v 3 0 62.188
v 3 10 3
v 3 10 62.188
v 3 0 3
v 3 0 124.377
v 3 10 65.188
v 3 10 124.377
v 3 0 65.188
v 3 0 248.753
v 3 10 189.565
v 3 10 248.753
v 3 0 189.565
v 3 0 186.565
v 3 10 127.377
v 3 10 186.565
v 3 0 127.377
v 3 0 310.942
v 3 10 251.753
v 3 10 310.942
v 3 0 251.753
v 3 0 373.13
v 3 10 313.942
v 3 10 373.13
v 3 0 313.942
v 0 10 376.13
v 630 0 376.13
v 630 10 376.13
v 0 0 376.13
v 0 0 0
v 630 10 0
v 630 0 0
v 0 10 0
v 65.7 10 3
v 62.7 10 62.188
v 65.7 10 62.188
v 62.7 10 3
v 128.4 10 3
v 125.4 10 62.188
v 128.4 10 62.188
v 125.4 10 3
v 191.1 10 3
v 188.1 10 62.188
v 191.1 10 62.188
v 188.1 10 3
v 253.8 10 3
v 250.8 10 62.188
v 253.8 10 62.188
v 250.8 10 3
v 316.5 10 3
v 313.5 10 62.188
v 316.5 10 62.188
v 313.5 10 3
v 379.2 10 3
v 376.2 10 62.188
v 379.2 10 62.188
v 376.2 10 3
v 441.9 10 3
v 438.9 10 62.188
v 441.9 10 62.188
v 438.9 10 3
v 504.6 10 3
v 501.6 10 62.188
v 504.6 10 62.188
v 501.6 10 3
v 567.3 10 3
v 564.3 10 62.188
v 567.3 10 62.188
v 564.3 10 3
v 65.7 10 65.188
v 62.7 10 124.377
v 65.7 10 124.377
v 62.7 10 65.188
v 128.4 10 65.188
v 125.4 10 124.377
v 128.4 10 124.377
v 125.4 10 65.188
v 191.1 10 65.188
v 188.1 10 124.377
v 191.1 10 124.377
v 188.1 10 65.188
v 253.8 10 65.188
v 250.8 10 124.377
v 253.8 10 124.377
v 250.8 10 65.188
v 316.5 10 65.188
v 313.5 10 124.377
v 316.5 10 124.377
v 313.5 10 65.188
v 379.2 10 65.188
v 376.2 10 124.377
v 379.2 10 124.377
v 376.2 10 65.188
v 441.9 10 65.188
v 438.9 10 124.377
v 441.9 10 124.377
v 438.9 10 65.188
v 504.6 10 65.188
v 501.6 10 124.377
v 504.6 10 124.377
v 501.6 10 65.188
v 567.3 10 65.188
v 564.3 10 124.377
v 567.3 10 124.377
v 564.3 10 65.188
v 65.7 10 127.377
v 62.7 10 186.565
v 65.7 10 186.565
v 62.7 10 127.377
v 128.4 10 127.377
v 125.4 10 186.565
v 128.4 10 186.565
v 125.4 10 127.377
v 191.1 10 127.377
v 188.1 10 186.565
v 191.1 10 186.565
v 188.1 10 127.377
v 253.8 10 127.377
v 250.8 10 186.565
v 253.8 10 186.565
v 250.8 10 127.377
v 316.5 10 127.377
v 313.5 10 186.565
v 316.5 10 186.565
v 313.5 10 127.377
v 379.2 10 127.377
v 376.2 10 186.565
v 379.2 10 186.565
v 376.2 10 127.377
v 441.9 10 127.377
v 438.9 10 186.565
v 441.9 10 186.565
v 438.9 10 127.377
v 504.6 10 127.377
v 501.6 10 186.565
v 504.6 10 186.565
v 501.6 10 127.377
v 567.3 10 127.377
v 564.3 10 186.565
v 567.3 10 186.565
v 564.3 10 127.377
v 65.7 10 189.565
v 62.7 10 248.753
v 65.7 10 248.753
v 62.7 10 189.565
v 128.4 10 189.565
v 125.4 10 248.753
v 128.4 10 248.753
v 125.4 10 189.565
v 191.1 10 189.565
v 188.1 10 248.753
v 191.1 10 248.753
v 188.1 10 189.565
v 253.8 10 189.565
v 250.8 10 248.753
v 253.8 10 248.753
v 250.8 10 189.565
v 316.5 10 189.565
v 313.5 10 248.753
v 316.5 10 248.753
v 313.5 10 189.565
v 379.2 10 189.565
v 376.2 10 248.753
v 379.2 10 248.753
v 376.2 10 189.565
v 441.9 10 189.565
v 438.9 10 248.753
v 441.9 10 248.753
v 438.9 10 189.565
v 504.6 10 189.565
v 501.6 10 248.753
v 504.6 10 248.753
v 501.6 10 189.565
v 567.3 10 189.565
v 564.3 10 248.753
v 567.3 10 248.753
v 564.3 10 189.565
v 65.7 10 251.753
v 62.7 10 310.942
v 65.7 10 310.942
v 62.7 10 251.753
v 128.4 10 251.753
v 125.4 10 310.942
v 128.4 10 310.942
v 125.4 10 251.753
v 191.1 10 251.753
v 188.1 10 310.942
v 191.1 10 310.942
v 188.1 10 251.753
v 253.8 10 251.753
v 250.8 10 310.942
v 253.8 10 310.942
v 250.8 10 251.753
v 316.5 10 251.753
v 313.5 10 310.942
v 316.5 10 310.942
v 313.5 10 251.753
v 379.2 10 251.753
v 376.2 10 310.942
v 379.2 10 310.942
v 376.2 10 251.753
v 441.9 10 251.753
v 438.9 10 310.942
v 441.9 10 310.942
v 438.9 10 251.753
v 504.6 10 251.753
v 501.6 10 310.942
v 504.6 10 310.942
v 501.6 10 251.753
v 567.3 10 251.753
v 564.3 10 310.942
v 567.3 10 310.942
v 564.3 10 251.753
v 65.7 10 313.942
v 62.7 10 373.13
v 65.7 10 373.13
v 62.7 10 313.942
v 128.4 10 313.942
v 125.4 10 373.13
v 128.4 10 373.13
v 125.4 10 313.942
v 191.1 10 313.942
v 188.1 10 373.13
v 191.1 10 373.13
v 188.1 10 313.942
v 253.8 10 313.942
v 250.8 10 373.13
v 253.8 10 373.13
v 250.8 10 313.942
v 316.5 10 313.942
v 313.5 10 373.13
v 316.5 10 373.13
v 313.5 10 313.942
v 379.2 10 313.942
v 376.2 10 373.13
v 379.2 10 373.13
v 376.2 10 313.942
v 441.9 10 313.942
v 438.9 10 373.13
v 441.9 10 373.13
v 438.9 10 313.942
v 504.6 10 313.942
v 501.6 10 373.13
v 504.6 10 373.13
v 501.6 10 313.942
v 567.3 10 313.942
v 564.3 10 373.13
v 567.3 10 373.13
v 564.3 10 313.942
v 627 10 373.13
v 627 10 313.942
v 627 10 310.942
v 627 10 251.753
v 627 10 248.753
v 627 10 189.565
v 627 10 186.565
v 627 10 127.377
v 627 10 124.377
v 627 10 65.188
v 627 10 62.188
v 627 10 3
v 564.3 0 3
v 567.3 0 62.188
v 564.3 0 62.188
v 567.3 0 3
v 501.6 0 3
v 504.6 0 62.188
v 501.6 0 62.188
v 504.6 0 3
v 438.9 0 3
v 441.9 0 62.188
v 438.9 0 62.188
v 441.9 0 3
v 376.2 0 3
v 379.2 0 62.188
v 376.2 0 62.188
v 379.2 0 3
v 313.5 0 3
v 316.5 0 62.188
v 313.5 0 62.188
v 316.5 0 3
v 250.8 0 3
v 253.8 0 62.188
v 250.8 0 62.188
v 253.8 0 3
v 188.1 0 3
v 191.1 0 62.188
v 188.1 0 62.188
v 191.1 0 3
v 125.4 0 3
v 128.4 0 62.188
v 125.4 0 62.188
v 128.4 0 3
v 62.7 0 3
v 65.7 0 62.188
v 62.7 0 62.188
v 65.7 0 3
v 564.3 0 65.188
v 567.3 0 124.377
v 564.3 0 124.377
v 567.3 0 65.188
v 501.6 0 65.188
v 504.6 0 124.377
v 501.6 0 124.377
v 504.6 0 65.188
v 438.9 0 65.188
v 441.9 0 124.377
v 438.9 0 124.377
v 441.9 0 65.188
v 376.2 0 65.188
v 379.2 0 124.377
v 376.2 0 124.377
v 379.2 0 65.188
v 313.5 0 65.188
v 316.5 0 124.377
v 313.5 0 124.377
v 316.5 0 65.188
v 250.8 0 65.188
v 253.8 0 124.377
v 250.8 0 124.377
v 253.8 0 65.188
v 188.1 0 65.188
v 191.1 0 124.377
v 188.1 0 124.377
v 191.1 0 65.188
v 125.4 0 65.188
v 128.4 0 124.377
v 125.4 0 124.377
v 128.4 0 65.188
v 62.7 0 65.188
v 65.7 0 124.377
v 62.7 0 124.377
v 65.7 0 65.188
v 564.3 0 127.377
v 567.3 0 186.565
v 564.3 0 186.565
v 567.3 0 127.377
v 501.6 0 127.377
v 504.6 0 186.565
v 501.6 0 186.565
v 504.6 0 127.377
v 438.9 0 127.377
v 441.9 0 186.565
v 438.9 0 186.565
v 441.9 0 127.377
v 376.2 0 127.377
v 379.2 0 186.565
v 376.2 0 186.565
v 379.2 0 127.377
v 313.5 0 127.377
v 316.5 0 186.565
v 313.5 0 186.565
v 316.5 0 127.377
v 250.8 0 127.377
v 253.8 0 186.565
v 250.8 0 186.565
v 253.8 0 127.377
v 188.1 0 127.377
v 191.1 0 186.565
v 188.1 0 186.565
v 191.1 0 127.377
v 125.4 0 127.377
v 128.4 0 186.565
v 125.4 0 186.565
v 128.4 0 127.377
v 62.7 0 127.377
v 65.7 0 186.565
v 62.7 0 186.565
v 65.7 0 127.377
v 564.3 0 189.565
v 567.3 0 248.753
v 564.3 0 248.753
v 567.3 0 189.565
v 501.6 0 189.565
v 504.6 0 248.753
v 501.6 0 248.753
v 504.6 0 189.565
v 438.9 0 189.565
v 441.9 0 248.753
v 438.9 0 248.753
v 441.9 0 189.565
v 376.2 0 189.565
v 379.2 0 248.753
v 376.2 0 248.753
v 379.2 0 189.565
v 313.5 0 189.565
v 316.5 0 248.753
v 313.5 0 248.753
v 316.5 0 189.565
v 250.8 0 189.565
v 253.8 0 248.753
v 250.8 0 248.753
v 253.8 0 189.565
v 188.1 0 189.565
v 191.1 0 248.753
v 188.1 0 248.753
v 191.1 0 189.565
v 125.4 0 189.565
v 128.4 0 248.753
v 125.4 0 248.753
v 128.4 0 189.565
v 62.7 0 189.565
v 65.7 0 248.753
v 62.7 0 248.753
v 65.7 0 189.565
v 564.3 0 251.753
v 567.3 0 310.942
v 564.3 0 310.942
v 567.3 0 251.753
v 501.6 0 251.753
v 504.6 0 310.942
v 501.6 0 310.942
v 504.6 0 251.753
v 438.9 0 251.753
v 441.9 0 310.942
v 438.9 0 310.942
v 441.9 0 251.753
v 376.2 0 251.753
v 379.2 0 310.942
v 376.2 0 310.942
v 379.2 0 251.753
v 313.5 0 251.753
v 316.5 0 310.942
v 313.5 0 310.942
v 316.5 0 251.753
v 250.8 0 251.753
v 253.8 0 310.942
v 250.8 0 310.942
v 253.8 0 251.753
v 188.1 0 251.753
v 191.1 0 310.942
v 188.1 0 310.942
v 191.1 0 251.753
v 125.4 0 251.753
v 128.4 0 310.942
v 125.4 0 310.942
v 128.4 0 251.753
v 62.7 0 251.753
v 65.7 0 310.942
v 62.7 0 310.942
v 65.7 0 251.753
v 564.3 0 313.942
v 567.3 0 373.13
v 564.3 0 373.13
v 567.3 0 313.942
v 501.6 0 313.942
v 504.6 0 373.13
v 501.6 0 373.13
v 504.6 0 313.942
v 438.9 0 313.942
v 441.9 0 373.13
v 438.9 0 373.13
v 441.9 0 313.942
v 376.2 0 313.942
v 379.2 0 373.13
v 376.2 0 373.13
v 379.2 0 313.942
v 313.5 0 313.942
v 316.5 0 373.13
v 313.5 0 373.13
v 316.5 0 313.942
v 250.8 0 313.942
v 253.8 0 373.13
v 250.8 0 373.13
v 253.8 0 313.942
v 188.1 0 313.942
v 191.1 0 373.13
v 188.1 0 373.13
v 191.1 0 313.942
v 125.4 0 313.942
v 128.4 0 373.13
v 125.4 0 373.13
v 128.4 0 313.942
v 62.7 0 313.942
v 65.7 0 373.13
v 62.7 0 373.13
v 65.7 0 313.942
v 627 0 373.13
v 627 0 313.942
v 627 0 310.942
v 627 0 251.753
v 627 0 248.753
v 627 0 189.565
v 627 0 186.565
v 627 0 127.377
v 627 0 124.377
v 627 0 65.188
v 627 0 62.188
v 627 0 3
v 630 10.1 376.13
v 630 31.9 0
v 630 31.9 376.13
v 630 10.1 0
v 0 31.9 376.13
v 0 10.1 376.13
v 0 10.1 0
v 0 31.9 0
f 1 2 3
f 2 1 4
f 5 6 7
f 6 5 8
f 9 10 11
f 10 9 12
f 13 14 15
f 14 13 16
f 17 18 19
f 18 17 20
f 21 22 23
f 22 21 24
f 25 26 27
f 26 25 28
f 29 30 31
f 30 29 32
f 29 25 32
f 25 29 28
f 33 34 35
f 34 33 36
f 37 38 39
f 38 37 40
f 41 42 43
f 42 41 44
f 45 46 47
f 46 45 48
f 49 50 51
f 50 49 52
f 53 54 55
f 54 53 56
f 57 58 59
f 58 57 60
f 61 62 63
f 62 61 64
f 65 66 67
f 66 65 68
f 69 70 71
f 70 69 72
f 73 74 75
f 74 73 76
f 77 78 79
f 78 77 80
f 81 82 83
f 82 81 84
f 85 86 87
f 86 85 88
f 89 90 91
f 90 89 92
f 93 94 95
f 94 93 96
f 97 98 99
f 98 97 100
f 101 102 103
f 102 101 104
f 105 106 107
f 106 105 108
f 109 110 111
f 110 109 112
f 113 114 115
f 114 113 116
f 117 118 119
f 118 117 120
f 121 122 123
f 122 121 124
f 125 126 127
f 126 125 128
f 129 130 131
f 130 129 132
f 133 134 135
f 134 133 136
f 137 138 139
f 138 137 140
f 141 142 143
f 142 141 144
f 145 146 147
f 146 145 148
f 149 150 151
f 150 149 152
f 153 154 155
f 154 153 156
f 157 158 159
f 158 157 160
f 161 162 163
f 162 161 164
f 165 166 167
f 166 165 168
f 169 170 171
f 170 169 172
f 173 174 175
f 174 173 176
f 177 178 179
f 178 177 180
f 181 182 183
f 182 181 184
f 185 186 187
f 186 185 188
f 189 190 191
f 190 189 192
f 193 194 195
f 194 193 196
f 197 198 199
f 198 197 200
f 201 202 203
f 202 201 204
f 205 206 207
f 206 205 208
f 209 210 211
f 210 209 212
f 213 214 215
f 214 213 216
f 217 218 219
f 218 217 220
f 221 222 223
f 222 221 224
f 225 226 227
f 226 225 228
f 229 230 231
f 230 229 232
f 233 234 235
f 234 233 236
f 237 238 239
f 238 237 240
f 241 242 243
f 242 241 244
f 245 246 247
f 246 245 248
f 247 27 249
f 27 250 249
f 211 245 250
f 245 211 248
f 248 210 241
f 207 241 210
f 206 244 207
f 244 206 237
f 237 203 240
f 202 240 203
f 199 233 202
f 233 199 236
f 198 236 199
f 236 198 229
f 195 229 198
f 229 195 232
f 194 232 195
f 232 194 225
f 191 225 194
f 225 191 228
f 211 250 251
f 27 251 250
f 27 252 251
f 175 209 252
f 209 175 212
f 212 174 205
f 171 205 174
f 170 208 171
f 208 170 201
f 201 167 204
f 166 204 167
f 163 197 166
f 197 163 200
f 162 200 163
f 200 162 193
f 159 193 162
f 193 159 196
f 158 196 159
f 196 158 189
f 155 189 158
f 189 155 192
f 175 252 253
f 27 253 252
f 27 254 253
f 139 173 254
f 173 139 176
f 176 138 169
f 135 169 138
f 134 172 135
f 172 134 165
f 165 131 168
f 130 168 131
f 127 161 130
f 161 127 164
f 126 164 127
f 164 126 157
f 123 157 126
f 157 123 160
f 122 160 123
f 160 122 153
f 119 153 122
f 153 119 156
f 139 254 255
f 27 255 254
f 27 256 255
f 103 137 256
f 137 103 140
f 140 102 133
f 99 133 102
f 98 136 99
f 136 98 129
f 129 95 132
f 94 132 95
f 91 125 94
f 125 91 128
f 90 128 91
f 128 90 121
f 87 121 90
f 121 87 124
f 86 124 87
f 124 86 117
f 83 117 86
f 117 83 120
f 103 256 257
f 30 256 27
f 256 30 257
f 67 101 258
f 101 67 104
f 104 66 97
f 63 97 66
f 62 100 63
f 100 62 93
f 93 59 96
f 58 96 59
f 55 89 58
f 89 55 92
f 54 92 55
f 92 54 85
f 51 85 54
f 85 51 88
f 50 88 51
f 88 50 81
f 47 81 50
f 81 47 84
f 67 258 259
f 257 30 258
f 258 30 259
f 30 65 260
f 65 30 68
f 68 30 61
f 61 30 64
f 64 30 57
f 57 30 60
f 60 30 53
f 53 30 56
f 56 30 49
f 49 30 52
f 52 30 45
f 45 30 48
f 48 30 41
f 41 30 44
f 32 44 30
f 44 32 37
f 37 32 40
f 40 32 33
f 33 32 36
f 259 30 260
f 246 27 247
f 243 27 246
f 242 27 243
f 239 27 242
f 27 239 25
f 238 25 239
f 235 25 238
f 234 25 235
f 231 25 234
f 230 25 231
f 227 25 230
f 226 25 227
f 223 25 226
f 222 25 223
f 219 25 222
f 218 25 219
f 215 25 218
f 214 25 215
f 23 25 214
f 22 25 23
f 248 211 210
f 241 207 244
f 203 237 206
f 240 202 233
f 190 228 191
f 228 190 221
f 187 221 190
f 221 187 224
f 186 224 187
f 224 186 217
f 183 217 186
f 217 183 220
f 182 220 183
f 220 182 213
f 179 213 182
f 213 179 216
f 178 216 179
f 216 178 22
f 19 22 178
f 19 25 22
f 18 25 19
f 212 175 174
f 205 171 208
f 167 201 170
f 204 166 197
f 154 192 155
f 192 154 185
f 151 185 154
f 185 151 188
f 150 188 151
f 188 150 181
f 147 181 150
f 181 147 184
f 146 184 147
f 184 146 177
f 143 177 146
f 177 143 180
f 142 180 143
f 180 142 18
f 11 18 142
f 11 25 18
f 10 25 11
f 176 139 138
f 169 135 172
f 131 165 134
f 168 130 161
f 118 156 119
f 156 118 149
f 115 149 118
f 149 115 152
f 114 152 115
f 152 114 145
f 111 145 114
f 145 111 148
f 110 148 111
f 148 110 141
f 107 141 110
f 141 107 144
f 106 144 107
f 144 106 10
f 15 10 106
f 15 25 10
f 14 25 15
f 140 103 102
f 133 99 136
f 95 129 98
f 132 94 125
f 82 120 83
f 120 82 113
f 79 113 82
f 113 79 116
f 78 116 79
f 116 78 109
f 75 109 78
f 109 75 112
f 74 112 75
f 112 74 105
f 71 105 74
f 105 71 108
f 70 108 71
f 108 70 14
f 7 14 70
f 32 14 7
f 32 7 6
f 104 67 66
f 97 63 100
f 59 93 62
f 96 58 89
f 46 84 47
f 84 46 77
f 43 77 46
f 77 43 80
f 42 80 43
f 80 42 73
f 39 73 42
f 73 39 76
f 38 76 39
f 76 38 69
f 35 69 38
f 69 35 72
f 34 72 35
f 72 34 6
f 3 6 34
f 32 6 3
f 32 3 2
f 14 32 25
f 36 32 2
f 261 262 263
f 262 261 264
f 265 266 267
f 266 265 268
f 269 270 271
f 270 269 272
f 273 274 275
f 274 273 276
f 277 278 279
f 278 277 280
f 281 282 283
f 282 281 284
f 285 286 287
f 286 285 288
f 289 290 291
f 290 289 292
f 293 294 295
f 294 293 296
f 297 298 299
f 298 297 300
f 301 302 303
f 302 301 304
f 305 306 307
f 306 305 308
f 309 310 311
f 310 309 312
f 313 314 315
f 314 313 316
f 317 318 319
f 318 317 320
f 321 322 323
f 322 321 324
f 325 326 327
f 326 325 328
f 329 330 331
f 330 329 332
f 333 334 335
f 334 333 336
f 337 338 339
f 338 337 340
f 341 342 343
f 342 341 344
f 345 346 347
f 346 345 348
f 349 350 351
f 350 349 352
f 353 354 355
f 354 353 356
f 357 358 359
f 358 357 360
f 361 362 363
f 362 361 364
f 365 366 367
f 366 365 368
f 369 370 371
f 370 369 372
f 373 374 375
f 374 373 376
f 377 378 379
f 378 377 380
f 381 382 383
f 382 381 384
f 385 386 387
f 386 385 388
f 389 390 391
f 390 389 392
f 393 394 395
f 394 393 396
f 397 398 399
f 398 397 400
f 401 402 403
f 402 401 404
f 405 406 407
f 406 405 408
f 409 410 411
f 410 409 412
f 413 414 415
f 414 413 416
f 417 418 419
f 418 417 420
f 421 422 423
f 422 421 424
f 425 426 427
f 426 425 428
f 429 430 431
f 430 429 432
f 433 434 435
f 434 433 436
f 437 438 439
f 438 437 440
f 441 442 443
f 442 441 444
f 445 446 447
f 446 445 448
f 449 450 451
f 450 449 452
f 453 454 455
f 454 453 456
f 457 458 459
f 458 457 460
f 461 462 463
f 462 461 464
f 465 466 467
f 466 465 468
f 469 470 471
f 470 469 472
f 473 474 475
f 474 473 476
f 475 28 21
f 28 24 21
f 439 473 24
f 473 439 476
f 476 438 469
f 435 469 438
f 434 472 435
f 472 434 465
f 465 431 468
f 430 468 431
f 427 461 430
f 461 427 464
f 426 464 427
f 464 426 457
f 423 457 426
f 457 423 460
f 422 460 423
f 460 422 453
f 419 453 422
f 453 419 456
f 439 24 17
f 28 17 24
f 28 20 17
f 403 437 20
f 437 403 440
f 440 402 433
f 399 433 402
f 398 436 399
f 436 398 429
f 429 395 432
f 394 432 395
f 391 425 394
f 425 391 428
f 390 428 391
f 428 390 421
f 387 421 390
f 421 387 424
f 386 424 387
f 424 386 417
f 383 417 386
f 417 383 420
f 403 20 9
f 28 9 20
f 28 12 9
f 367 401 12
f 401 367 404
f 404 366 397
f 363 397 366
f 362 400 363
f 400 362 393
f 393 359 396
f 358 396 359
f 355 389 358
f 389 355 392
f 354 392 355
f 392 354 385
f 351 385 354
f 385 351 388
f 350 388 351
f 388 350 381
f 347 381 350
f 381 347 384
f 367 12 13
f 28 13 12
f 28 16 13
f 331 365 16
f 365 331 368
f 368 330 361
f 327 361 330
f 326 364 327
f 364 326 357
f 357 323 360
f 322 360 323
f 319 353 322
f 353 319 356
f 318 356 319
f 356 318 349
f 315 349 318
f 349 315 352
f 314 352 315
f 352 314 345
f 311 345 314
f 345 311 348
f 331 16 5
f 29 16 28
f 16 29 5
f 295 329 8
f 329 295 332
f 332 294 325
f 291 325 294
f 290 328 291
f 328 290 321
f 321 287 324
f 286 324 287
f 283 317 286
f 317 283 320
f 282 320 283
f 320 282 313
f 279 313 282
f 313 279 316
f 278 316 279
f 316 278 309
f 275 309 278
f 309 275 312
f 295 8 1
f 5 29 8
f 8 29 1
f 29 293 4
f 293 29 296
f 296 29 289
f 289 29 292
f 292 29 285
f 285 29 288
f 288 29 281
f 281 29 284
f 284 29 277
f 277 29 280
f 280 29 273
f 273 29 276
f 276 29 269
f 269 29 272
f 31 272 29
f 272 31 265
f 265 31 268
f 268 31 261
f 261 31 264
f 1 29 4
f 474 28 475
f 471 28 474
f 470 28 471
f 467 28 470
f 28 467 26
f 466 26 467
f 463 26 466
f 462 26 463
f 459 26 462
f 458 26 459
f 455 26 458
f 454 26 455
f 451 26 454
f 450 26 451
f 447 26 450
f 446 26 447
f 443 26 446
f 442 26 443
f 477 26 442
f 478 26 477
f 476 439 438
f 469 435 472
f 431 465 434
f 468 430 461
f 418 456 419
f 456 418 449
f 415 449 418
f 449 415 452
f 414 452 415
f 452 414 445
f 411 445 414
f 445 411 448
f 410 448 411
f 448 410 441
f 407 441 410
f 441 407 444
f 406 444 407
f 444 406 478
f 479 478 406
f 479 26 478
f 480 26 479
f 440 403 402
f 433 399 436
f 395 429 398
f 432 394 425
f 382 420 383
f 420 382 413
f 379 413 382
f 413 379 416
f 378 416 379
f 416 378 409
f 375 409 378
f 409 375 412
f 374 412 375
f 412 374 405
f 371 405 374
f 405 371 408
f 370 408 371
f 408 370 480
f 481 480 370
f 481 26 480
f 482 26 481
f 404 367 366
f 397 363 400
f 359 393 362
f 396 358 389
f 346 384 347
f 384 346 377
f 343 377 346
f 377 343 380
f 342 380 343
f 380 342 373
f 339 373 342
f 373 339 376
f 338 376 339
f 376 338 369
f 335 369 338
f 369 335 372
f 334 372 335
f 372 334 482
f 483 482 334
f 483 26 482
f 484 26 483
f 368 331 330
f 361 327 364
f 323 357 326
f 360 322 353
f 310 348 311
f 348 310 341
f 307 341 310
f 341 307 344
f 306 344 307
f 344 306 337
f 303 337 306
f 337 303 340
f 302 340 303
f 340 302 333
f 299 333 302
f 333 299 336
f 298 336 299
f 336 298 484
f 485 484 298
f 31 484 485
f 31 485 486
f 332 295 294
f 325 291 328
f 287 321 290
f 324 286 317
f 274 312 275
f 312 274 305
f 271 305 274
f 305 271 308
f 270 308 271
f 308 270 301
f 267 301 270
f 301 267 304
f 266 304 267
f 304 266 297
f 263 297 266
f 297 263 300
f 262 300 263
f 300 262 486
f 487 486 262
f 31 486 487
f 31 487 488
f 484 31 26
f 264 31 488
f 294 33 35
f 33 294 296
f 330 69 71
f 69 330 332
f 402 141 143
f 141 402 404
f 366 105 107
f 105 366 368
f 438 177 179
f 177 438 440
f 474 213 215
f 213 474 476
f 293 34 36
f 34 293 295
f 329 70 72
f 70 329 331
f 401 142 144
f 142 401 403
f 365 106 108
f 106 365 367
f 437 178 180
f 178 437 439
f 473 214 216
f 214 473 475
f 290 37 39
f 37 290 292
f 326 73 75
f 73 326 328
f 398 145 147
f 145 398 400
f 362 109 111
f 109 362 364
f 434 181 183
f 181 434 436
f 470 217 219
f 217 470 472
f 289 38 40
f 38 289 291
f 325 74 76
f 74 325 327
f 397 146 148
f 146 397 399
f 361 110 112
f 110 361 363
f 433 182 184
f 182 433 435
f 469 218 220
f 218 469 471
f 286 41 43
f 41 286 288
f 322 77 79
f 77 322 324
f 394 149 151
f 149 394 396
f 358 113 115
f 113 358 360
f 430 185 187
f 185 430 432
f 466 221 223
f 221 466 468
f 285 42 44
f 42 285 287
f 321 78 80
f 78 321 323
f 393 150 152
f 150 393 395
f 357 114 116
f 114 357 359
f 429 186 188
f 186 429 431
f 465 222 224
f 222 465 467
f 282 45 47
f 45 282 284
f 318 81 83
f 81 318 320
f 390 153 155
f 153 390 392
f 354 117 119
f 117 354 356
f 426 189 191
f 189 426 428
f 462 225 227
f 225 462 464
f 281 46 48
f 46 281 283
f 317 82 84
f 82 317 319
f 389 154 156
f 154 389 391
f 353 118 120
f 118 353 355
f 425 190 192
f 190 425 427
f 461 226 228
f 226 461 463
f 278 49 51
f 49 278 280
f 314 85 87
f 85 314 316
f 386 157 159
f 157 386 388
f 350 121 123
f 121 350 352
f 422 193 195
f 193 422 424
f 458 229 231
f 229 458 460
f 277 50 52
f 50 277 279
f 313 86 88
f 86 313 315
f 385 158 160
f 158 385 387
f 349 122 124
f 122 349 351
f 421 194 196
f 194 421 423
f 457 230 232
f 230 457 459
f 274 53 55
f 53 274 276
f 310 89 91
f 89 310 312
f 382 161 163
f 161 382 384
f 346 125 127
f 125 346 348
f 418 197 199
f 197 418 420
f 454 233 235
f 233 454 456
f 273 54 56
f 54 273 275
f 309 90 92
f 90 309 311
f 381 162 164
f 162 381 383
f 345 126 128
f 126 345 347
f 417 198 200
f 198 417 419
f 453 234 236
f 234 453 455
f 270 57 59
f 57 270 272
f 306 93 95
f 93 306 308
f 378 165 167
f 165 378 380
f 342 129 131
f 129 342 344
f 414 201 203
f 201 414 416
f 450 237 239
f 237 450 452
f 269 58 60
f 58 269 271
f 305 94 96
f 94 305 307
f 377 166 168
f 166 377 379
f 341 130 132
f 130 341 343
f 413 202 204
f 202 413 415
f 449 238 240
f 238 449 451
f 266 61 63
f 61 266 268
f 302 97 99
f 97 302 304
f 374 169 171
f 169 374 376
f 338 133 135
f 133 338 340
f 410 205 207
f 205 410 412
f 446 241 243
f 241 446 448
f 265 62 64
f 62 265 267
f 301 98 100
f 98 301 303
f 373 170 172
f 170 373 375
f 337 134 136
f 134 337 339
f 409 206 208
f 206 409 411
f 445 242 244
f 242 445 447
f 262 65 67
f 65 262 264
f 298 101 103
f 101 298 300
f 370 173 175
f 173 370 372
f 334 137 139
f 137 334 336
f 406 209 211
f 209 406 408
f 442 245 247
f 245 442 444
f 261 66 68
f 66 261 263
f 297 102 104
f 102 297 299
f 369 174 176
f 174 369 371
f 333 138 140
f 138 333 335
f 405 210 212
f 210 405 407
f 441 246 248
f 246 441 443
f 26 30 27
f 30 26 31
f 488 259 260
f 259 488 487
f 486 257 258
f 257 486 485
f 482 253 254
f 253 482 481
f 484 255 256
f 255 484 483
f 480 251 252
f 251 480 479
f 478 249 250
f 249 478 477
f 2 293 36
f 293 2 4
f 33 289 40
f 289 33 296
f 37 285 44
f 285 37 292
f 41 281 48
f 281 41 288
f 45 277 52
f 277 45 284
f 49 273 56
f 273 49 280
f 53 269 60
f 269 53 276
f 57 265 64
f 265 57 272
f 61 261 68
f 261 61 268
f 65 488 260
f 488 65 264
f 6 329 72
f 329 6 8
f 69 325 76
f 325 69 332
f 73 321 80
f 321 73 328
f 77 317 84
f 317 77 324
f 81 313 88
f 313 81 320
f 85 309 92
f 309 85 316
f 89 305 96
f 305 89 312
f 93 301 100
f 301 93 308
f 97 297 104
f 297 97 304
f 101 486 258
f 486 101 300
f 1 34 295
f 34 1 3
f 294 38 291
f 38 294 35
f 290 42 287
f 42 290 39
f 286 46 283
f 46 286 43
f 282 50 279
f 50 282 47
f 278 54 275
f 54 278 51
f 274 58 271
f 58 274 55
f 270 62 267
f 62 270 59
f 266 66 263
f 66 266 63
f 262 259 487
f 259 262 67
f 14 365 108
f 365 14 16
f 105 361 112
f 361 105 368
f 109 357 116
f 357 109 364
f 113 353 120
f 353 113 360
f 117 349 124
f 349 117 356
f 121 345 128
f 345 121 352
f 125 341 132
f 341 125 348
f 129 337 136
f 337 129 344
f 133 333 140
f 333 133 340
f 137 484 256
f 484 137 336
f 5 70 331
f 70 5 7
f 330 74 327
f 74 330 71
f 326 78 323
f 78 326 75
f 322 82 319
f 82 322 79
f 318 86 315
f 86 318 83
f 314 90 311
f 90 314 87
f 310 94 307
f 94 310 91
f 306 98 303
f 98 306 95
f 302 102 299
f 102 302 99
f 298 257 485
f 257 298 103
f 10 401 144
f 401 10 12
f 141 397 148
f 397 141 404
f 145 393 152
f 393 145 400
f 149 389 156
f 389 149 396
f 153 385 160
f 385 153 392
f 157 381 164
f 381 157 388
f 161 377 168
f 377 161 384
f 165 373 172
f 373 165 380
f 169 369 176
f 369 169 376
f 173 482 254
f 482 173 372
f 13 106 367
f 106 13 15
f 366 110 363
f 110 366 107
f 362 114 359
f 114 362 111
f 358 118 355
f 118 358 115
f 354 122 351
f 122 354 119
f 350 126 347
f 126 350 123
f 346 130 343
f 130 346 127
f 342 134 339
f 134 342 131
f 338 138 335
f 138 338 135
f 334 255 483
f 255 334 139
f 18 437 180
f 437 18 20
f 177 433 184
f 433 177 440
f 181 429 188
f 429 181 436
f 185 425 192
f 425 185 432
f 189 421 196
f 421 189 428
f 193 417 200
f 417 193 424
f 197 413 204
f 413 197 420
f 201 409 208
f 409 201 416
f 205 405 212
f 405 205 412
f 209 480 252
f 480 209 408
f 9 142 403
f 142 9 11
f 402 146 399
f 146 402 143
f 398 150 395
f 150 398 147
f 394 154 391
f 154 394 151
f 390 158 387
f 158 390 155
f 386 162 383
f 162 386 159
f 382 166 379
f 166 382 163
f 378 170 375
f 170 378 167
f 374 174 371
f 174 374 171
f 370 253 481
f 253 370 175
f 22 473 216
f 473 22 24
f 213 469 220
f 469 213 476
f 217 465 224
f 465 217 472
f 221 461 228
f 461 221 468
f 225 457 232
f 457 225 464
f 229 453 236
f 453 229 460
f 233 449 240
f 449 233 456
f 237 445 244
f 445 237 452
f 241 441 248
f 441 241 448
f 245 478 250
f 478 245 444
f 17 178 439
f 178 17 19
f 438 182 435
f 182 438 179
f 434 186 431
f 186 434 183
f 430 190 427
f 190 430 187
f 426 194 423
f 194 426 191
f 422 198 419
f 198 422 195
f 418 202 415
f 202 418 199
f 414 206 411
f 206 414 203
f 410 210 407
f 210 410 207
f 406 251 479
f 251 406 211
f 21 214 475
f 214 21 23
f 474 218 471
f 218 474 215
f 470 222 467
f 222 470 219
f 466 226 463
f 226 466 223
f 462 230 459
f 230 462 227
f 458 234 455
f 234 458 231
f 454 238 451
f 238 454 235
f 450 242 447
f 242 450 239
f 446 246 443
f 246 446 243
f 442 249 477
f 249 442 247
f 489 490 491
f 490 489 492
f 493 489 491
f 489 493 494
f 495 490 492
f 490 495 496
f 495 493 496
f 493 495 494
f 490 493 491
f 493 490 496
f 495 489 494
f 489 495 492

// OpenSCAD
translate([0,10.1, 0]) color("black") cube([630, 21.8, 376.13]);

union() {
	dist_x = (630-3) / 10;
	echo(dist_x);
	for (x = [0 : (630/dist_x)])
		translate([x*dist_x, 0, 0]) cube([3, 10, 376.13]);

	dist_z = (376.13-3) / 6;
	echo(dist_z);
	for (z = [0 : (376.13/dist_z)])
		translate([0, 0, z*dist_z]) cube([630, 10, 3]);
}

cost_per_meter = 9/3;
totalLength = (376.13* 16) + (630 * 10);
cost = (totalLength/1000) * cost_per_meter;
echo (cost);
